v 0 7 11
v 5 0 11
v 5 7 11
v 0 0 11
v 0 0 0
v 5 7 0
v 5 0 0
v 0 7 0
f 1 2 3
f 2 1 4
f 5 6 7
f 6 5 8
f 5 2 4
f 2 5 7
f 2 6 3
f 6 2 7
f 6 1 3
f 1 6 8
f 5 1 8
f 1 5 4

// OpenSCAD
// Generated by SolidPython 1.0.1 on 2020-07-29 00:39:26


cube(size = [5, 7, 11]);
/***********************************************
*********      SolidPython code:      **********
************************************************
 
# import packages: SolidPython
from solid import *
from solid.utils import *
from itertools import chain, combinations


class Resize:

    def __init__(self, scad_file):
        self.scad_file = scad_file
        #self.scad_file = import_scad(scad_file)
        # cone/cylinder param:
        self.r1 = 0
        self.r2 = 0
        self.h = 0
        # rectangular prism param:
        self.w = 0
        self.l = 0
        # ellipse param:
        self.r = 0

    # import OpenScad code (file name corresponds to shape)


    # classify shape + parameters
    def assign(self, param1, param2, param3):
        if self.scad_file == 'cone.scad':
            self.r1 = param1
            self.r2 = param2
            self.h = param3
        elif self.scad_file == 'cylinder.scad':
            self.r1 = param1
            self.r2 = param2
            self.h = param3
        elif self.scad_file == 'rectangularPrism.scad':
            self.h = param1
            self.l = param2
            self.w = param3
        else:
            self.r = param1
            self.h = param2

    # resize parameters
    def iterate(self):
        x = range(3, 20, 2)
        i = 1
        if self.scad_file == 'cone.scad':
            tempList = list(combinations(x, 2))
            for temp in tempList:
                param1 = temp[0]
                param2 = temp[1]
                filepath = 'produced_scad_files/' + 'cone' + str(param1) + '_' + str(param2) + '_' + '.scad'
                scad_render_to_file(cylinder(h=param1, r1=param2, r2=0), filepath)

        elif self.scad_file == 'cylinder.scad':
            tempList = list(combinations(x, 3))
            for temp in tempList:
                param1 = temp[0]
                param2 = temp[1]
                filepath = 'produced_scad_files/' + 'cylinder' + str(param1) + '_' + str(param2) + '_' + '.scad'
                scad_render_to_file(cylinder(h=param1, r1=param2, r2=param2), filepath)

        elif self.scad_file == 'rectangularPrism.scad':
            tempList = list(combinations(x, 3))
            for temp in tempList:
                param1 = temp[0]
                param2 = temp[1]
                param3 = temp[2]
                filepath = 'produced_scad_files/' + 'rectangularPrism' + str(param1) + '_' + str(param2) + '_' + str(
                    param3) + '.scad'
                scad_render_to_file(cube(size=(param1, param2, param3)), filepath)

        elif self.scad_file == 'ellipse.scad':
            tempList = list(combinations(x, 4))
            for temp in tempList:
                param1 = temp[0]
                param2 = temp[1]
                param3 = temp[2]
                param4 = temp[3]
                filepath = 'produced_scad_files/' + 'ellipse' + str(param1) + '_' + str(param2) + '_' + str(param3) + '_' + str(param4) + '.scad'
                scad_render_to_file(scale([param1, param2, param3])(sphere(r=param4)), filepath)

    def render_to_scadfile(self):
        scad_render_to_file(scad, 'example.scad') 
 
************************************************/
